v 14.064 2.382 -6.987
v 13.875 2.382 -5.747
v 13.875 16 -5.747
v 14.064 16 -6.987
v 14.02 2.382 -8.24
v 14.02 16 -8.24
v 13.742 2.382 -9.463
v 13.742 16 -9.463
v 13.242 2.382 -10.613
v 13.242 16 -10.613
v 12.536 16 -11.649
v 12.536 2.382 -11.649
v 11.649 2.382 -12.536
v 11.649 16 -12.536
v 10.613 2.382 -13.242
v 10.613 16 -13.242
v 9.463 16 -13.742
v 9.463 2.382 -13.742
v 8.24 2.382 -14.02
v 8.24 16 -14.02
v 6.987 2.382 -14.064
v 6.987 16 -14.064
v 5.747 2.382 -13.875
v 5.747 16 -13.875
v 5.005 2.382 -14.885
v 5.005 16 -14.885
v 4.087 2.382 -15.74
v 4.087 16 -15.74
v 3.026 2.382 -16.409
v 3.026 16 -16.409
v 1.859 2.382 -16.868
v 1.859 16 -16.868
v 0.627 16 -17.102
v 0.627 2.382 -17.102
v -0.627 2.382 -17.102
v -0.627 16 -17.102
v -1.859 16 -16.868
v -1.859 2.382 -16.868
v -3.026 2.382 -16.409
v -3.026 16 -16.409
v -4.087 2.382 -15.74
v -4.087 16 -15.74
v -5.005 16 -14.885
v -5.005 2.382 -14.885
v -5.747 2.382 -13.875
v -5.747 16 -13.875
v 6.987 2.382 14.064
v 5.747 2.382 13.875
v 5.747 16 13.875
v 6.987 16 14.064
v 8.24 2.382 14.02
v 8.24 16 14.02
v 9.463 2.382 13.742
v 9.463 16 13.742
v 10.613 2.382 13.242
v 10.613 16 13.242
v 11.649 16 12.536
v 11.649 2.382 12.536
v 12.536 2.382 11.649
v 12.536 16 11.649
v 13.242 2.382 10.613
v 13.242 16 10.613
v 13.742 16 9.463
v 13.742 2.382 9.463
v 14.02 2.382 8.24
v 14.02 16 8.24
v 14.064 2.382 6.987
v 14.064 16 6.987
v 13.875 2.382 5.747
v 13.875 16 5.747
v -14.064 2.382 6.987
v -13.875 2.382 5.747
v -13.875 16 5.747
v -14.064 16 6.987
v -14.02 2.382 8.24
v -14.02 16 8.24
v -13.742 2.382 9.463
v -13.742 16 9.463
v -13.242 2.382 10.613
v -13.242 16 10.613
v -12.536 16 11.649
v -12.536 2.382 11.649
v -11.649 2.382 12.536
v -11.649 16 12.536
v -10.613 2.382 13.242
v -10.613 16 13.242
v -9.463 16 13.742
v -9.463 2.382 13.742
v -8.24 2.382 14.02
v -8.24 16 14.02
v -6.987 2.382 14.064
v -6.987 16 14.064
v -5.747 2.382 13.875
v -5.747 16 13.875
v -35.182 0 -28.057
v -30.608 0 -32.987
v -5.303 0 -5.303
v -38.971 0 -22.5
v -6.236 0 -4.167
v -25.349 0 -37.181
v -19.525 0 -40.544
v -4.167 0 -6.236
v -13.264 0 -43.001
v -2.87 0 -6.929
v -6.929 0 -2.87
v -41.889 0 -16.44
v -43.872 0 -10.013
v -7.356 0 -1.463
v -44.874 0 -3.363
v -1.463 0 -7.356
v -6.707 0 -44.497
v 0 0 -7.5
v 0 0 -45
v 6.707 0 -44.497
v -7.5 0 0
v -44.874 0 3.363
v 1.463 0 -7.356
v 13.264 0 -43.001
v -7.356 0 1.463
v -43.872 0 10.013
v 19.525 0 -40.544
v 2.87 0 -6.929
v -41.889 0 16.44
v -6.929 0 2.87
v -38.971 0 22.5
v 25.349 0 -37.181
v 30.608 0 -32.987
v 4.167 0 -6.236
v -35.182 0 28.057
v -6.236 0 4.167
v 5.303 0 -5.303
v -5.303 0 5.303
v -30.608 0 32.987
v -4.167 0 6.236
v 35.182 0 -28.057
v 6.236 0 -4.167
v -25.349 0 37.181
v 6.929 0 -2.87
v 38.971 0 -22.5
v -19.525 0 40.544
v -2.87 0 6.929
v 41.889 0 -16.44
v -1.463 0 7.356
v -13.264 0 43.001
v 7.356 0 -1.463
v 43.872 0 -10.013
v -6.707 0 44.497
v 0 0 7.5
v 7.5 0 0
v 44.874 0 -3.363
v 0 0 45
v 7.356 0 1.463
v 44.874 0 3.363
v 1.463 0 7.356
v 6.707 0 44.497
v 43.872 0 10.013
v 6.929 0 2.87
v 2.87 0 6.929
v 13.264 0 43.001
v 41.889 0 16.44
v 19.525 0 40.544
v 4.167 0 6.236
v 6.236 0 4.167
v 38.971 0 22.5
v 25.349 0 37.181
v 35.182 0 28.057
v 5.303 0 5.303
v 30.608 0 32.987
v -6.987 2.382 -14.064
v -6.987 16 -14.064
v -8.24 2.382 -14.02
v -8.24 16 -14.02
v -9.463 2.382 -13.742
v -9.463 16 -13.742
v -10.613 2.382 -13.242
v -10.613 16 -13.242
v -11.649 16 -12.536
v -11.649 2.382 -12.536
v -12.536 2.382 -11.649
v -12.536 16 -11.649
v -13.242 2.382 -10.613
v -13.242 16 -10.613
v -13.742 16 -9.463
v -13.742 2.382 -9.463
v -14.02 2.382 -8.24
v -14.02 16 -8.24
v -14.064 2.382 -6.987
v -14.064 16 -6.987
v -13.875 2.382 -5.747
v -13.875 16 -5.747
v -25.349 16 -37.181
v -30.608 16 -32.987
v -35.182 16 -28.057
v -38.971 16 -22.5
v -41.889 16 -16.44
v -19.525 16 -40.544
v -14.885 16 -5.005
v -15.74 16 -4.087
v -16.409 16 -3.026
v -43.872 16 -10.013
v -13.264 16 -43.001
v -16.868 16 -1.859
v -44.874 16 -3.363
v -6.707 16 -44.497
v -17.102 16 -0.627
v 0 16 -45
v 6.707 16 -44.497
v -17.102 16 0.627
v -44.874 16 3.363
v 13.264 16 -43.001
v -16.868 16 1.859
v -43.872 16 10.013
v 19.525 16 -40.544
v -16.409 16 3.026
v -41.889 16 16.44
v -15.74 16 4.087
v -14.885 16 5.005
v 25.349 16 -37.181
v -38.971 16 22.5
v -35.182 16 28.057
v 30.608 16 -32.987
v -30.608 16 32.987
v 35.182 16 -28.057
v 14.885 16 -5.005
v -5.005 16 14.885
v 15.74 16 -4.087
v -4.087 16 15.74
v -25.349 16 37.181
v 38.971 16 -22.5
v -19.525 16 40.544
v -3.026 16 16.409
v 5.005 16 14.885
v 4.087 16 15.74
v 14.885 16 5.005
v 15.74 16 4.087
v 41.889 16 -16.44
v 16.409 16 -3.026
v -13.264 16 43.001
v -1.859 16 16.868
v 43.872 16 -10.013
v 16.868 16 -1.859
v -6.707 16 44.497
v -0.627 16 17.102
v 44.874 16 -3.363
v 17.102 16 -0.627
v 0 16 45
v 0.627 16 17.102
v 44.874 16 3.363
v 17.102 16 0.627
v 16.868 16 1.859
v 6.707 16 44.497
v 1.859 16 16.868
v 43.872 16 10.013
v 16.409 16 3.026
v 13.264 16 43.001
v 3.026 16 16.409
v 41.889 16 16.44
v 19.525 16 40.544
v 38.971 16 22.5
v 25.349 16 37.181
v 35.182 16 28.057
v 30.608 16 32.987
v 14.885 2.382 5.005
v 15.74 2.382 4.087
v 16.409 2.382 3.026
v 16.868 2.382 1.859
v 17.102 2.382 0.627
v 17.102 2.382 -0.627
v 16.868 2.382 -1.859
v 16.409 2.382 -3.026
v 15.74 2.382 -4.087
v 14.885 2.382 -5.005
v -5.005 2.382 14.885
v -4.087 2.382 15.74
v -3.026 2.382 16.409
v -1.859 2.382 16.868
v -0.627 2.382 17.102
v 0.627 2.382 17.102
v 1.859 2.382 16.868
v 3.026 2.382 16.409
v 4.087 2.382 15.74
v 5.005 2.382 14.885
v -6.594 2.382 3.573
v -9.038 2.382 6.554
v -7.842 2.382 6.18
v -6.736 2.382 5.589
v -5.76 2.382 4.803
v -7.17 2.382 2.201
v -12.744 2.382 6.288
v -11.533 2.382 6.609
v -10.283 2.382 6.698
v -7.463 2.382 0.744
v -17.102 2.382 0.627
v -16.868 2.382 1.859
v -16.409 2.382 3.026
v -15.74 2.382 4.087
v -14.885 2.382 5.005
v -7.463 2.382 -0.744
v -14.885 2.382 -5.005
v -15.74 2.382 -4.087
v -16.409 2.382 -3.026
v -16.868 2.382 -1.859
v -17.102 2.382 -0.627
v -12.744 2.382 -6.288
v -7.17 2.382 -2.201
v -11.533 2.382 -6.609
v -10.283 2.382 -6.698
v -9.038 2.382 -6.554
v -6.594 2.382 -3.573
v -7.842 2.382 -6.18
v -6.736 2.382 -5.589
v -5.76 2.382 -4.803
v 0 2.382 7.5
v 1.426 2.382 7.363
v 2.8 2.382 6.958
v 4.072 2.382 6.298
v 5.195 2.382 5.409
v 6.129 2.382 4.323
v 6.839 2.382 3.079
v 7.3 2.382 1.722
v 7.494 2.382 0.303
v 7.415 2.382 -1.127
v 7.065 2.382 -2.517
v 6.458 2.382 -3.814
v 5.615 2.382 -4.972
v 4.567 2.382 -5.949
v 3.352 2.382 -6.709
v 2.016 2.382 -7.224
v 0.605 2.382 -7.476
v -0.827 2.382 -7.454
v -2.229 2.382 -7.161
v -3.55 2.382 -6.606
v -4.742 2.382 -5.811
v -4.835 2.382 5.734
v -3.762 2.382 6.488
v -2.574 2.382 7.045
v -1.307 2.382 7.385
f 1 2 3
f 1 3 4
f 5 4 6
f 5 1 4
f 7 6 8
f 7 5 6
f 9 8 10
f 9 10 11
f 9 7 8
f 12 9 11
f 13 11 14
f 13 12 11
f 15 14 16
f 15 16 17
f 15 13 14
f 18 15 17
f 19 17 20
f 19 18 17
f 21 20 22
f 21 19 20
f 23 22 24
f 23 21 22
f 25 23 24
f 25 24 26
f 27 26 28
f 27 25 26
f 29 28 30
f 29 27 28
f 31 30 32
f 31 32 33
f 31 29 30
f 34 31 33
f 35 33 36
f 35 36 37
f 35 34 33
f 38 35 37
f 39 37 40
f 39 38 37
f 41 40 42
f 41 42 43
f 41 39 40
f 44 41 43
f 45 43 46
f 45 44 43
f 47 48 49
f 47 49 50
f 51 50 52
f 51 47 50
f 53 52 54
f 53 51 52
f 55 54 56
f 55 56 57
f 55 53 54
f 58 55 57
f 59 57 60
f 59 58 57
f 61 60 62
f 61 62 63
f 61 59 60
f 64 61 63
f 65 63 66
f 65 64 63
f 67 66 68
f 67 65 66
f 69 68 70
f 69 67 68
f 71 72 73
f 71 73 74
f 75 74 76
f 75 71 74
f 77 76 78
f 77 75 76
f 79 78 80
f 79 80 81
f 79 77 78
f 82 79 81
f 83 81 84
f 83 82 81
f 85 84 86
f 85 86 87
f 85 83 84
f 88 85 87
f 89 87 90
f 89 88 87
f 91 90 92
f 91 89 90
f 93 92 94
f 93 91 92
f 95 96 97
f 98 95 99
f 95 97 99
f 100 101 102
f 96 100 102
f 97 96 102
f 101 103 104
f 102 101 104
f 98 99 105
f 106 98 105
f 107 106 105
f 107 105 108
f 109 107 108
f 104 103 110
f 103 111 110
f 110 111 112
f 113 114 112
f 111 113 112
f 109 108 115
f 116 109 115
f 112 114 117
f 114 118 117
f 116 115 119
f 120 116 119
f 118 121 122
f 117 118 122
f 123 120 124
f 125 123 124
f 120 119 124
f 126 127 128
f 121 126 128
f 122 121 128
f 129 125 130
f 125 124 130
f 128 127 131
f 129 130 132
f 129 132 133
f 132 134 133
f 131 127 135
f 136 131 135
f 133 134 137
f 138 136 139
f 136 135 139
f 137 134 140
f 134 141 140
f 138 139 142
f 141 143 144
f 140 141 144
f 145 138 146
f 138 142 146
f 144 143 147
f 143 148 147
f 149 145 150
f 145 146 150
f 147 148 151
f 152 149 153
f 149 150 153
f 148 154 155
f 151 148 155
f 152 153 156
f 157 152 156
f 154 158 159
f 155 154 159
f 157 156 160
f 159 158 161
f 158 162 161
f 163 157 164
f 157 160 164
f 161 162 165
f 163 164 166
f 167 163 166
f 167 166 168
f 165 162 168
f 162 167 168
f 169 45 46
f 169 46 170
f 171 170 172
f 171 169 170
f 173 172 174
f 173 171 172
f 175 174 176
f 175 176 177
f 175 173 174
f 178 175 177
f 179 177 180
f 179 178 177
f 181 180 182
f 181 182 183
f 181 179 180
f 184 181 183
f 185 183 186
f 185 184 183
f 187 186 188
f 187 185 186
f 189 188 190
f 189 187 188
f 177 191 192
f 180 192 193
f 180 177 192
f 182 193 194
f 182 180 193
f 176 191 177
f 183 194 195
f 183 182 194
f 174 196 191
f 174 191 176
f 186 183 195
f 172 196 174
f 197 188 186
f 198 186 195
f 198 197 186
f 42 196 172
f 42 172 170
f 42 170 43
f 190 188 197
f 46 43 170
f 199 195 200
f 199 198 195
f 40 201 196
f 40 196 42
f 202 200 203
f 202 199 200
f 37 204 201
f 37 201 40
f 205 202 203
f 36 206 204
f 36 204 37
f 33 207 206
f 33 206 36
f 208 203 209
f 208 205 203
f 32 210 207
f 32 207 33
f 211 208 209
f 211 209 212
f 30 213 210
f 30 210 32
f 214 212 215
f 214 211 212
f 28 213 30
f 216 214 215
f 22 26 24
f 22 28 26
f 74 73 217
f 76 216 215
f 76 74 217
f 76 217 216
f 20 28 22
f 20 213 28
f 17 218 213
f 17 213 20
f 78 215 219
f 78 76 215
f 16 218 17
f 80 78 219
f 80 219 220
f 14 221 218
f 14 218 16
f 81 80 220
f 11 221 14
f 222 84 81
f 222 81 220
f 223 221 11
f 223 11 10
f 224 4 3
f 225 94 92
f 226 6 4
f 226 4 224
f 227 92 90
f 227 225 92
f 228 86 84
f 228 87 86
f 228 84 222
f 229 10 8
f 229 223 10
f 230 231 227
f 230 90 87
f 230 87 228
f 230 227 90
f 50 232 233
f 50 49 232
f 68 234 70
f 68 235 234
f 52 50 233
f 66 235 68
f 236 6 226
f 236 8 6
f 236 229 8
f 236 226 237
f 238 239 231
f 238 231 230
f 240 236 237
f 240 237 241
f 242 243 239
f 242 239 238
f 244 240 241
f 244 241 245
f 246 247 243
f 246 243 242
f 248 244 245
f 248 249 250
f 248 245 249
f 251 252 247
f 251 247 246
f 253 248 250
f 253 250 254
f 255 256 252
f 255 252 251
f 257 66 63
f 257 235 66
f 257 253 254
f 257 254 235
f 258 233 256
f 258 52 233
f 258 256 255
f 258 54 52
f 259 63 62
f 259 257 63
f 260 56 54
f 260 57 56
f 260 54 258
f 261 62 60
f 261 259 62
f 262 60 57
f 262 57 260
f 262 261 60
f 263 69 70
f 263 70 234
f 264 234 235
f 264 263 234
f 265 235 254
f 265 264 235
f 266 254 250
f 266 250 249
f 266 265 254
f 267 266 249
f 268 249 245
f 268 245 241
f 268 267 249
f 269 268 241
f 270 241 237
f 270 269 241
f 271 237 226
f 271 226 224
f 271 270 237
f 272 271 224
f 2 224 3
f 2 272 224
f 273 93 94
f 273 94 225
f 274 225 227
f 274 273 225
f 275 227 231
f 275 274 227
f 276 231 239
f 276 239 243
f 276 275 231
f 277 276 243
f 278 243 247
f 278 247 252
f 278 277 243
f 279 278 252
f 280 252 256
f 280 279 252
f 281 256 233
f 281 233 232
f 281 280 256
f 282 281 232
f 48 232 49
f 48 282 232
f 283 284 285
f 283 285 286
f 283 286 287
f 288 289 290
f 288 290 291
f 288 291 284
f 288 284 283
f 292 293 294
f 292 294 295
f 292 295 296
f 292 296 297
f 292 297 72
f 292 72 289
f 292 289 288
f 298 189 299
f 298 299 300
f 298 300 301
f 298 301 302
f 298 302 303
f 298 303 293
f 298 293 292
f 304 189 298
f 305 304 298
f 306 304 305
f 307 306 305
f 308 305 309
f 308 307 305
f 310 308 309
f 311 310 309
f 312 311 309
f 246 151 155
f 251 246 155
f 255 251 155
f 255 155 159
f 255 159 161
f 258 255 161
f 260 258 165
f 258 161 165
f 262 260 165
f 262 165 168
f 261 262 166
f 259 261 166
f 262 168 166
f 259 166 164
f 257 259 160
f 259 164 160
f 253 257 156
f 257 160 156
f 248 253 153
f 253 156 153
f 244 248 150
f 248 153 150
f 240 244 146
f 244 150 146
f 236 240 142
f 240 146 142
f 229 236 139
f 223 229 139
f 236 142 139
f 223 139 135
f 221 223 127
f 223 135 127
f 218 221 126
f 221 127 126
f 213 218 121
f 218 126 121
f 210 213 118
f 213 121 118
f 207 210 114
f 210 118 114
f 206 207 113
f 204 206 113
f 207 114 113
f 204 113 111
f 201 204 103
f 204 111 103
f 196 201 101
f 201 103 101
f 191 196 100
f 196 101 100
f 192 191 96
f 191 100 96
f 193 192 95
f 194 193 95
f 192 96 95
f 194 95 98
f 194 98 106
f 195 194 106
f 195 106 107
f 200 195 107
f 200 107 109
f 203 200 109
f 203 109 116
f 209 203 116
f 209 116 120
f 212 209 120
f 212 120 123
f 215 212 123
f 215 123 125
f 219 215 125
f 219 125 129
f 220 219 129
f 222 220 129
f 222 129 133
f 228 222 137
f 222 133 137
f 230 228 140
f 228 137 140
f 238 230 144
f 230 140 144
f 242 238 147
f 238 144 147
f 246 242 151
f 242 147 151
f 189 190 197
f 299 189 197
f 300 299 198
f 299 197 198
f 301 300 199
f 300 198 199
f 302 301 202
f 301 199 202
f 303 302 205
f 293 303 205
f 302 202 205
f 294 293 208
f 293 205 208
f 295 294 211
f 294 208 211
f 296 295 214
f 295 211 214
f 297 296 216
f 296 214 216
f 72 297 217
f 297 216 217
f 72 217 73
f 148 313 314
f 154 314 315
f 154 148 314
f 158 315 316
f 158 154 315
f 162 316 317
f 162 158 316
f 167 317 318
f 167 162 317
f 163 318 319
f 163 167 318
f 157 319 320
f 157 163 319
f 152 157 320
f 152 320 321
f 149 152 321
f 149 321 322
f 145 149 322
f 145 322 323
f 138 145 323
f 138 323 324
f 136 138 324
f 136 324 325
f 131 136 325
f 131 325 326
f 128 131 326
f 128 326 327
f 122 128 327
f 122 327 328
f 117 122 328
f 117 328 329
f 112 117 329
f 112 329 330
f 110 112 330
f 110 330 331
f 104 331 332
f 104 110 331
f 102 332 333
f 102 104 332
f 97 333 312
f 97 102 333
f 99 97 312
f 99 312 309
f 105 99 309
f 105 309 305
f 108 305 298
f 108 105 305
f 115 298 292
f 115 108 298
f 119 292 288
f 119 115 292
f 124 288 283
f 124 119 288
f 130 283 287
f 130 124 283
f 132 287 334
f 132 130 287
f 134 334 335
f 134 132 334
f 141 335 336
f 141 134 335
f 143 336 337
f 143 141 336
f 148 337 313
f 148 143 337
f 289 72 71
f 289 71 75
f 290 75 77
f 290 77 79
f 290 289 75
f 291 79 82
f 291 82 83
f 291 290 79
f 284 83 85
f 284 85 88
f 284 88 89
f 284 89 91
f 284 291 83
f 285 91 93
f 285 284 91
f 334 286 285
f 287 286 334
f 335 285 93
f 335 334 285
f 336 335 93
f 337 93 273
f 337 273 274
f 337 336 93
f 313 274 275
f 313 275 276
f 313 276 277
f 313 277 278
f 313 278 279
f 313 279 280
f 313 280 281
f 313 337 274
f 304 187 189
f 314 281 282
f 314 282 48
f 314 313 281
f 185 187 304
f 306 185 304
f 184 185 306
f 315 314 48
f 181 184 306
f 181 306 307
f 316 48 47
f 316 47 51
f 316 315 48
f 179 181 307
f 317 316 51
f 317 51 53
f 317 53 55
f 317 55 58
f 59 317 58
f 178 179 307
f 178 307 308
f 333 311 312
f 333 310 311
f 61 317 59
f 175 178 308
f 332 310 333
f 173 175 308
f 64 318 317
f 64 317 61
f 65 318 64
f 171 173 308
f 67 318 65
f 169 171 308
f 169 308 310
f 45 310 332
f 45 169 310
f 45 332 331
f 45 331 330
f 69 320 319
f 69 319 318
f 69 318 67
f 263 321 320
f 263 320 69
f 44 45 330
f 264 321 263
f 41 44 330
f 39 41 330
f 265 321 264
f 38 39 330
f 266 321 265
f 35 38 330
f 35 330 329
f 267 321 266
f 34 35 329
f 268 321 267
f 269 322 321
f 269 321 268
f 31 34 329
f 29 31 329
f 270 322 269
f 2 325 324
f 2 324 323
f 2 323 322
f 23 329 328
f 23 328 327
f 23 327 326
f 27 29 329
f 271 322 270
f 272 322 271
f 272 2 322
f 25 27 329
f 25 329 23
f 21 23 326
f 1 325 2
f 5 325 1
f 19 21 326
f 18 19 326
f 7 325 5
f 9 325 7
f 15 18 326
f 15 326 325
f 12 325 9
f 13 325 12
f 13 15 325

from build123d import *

# Parameters (mm, degrees)
SKETCH1_R           = 45
BOSS_EXTRUDE1_DEPTH = 16
SKETCH2_R           = 7.5
CUT_EXTRUDE1_DEPTH  = 66.620118866
SKETCH3_R           = 6.700020908
CUT_EXTRUDE2_DEPTH  = 13.617825353
CIRPATTERN1_COUNT   = 8


with BuildPart() as part:
    # Sketch1 → Boss-Extrude1 (new body)
    with BuildSketch(Plane(origin=(0, 0, 0), x_dir=(1, 0, 0), z_dir=(0, 1, 0))):
        Circle(SKETCH1_R)
    extrude(amount=BOSS_EXTRUDE1_DEPTH)

    # Sketch2 → Cut-Extrude1 (cut, through all)
    with BuildSketch(Plane(origin=(0, 0, 0), x_dir=(1, 0, 0), z_dir=(0, 1, 0))):
        Circle(SKETCH2_R)
    extrude(amount=CUT_EXTRUDE1_DEPTH, mode=Mode.SUBTRACT)

    # Sketch3 → Cut-Extrude2 (cut)
    with BuildSketch(Plane(origin=(0, 16, 0), x_dir=(1, 0, 0), z_dir=(0, 1, 0))):
        with Locations((-10.430928244, 0)):
            Circle(SKETCH3_R)
    cut_extrude2 = extrude(amount=-CUT_EXTRUDE2_DEPTH, mode=Mode.SUBTRACT)

    # CirPattern1: Cut-Extrude2 ×8 about axis
    cirpattern1_axis = Axis((0, 0, 0), (0, 1, 0))
    for i in range(1, CIRPATTERN1_COUNT):
        add(cut_extrude2.rotate(cirpattern1_axis, i * 360 / CIRPATTERN1_COUNT), mode=Mode.SUBTRACT)


solid = part.part
